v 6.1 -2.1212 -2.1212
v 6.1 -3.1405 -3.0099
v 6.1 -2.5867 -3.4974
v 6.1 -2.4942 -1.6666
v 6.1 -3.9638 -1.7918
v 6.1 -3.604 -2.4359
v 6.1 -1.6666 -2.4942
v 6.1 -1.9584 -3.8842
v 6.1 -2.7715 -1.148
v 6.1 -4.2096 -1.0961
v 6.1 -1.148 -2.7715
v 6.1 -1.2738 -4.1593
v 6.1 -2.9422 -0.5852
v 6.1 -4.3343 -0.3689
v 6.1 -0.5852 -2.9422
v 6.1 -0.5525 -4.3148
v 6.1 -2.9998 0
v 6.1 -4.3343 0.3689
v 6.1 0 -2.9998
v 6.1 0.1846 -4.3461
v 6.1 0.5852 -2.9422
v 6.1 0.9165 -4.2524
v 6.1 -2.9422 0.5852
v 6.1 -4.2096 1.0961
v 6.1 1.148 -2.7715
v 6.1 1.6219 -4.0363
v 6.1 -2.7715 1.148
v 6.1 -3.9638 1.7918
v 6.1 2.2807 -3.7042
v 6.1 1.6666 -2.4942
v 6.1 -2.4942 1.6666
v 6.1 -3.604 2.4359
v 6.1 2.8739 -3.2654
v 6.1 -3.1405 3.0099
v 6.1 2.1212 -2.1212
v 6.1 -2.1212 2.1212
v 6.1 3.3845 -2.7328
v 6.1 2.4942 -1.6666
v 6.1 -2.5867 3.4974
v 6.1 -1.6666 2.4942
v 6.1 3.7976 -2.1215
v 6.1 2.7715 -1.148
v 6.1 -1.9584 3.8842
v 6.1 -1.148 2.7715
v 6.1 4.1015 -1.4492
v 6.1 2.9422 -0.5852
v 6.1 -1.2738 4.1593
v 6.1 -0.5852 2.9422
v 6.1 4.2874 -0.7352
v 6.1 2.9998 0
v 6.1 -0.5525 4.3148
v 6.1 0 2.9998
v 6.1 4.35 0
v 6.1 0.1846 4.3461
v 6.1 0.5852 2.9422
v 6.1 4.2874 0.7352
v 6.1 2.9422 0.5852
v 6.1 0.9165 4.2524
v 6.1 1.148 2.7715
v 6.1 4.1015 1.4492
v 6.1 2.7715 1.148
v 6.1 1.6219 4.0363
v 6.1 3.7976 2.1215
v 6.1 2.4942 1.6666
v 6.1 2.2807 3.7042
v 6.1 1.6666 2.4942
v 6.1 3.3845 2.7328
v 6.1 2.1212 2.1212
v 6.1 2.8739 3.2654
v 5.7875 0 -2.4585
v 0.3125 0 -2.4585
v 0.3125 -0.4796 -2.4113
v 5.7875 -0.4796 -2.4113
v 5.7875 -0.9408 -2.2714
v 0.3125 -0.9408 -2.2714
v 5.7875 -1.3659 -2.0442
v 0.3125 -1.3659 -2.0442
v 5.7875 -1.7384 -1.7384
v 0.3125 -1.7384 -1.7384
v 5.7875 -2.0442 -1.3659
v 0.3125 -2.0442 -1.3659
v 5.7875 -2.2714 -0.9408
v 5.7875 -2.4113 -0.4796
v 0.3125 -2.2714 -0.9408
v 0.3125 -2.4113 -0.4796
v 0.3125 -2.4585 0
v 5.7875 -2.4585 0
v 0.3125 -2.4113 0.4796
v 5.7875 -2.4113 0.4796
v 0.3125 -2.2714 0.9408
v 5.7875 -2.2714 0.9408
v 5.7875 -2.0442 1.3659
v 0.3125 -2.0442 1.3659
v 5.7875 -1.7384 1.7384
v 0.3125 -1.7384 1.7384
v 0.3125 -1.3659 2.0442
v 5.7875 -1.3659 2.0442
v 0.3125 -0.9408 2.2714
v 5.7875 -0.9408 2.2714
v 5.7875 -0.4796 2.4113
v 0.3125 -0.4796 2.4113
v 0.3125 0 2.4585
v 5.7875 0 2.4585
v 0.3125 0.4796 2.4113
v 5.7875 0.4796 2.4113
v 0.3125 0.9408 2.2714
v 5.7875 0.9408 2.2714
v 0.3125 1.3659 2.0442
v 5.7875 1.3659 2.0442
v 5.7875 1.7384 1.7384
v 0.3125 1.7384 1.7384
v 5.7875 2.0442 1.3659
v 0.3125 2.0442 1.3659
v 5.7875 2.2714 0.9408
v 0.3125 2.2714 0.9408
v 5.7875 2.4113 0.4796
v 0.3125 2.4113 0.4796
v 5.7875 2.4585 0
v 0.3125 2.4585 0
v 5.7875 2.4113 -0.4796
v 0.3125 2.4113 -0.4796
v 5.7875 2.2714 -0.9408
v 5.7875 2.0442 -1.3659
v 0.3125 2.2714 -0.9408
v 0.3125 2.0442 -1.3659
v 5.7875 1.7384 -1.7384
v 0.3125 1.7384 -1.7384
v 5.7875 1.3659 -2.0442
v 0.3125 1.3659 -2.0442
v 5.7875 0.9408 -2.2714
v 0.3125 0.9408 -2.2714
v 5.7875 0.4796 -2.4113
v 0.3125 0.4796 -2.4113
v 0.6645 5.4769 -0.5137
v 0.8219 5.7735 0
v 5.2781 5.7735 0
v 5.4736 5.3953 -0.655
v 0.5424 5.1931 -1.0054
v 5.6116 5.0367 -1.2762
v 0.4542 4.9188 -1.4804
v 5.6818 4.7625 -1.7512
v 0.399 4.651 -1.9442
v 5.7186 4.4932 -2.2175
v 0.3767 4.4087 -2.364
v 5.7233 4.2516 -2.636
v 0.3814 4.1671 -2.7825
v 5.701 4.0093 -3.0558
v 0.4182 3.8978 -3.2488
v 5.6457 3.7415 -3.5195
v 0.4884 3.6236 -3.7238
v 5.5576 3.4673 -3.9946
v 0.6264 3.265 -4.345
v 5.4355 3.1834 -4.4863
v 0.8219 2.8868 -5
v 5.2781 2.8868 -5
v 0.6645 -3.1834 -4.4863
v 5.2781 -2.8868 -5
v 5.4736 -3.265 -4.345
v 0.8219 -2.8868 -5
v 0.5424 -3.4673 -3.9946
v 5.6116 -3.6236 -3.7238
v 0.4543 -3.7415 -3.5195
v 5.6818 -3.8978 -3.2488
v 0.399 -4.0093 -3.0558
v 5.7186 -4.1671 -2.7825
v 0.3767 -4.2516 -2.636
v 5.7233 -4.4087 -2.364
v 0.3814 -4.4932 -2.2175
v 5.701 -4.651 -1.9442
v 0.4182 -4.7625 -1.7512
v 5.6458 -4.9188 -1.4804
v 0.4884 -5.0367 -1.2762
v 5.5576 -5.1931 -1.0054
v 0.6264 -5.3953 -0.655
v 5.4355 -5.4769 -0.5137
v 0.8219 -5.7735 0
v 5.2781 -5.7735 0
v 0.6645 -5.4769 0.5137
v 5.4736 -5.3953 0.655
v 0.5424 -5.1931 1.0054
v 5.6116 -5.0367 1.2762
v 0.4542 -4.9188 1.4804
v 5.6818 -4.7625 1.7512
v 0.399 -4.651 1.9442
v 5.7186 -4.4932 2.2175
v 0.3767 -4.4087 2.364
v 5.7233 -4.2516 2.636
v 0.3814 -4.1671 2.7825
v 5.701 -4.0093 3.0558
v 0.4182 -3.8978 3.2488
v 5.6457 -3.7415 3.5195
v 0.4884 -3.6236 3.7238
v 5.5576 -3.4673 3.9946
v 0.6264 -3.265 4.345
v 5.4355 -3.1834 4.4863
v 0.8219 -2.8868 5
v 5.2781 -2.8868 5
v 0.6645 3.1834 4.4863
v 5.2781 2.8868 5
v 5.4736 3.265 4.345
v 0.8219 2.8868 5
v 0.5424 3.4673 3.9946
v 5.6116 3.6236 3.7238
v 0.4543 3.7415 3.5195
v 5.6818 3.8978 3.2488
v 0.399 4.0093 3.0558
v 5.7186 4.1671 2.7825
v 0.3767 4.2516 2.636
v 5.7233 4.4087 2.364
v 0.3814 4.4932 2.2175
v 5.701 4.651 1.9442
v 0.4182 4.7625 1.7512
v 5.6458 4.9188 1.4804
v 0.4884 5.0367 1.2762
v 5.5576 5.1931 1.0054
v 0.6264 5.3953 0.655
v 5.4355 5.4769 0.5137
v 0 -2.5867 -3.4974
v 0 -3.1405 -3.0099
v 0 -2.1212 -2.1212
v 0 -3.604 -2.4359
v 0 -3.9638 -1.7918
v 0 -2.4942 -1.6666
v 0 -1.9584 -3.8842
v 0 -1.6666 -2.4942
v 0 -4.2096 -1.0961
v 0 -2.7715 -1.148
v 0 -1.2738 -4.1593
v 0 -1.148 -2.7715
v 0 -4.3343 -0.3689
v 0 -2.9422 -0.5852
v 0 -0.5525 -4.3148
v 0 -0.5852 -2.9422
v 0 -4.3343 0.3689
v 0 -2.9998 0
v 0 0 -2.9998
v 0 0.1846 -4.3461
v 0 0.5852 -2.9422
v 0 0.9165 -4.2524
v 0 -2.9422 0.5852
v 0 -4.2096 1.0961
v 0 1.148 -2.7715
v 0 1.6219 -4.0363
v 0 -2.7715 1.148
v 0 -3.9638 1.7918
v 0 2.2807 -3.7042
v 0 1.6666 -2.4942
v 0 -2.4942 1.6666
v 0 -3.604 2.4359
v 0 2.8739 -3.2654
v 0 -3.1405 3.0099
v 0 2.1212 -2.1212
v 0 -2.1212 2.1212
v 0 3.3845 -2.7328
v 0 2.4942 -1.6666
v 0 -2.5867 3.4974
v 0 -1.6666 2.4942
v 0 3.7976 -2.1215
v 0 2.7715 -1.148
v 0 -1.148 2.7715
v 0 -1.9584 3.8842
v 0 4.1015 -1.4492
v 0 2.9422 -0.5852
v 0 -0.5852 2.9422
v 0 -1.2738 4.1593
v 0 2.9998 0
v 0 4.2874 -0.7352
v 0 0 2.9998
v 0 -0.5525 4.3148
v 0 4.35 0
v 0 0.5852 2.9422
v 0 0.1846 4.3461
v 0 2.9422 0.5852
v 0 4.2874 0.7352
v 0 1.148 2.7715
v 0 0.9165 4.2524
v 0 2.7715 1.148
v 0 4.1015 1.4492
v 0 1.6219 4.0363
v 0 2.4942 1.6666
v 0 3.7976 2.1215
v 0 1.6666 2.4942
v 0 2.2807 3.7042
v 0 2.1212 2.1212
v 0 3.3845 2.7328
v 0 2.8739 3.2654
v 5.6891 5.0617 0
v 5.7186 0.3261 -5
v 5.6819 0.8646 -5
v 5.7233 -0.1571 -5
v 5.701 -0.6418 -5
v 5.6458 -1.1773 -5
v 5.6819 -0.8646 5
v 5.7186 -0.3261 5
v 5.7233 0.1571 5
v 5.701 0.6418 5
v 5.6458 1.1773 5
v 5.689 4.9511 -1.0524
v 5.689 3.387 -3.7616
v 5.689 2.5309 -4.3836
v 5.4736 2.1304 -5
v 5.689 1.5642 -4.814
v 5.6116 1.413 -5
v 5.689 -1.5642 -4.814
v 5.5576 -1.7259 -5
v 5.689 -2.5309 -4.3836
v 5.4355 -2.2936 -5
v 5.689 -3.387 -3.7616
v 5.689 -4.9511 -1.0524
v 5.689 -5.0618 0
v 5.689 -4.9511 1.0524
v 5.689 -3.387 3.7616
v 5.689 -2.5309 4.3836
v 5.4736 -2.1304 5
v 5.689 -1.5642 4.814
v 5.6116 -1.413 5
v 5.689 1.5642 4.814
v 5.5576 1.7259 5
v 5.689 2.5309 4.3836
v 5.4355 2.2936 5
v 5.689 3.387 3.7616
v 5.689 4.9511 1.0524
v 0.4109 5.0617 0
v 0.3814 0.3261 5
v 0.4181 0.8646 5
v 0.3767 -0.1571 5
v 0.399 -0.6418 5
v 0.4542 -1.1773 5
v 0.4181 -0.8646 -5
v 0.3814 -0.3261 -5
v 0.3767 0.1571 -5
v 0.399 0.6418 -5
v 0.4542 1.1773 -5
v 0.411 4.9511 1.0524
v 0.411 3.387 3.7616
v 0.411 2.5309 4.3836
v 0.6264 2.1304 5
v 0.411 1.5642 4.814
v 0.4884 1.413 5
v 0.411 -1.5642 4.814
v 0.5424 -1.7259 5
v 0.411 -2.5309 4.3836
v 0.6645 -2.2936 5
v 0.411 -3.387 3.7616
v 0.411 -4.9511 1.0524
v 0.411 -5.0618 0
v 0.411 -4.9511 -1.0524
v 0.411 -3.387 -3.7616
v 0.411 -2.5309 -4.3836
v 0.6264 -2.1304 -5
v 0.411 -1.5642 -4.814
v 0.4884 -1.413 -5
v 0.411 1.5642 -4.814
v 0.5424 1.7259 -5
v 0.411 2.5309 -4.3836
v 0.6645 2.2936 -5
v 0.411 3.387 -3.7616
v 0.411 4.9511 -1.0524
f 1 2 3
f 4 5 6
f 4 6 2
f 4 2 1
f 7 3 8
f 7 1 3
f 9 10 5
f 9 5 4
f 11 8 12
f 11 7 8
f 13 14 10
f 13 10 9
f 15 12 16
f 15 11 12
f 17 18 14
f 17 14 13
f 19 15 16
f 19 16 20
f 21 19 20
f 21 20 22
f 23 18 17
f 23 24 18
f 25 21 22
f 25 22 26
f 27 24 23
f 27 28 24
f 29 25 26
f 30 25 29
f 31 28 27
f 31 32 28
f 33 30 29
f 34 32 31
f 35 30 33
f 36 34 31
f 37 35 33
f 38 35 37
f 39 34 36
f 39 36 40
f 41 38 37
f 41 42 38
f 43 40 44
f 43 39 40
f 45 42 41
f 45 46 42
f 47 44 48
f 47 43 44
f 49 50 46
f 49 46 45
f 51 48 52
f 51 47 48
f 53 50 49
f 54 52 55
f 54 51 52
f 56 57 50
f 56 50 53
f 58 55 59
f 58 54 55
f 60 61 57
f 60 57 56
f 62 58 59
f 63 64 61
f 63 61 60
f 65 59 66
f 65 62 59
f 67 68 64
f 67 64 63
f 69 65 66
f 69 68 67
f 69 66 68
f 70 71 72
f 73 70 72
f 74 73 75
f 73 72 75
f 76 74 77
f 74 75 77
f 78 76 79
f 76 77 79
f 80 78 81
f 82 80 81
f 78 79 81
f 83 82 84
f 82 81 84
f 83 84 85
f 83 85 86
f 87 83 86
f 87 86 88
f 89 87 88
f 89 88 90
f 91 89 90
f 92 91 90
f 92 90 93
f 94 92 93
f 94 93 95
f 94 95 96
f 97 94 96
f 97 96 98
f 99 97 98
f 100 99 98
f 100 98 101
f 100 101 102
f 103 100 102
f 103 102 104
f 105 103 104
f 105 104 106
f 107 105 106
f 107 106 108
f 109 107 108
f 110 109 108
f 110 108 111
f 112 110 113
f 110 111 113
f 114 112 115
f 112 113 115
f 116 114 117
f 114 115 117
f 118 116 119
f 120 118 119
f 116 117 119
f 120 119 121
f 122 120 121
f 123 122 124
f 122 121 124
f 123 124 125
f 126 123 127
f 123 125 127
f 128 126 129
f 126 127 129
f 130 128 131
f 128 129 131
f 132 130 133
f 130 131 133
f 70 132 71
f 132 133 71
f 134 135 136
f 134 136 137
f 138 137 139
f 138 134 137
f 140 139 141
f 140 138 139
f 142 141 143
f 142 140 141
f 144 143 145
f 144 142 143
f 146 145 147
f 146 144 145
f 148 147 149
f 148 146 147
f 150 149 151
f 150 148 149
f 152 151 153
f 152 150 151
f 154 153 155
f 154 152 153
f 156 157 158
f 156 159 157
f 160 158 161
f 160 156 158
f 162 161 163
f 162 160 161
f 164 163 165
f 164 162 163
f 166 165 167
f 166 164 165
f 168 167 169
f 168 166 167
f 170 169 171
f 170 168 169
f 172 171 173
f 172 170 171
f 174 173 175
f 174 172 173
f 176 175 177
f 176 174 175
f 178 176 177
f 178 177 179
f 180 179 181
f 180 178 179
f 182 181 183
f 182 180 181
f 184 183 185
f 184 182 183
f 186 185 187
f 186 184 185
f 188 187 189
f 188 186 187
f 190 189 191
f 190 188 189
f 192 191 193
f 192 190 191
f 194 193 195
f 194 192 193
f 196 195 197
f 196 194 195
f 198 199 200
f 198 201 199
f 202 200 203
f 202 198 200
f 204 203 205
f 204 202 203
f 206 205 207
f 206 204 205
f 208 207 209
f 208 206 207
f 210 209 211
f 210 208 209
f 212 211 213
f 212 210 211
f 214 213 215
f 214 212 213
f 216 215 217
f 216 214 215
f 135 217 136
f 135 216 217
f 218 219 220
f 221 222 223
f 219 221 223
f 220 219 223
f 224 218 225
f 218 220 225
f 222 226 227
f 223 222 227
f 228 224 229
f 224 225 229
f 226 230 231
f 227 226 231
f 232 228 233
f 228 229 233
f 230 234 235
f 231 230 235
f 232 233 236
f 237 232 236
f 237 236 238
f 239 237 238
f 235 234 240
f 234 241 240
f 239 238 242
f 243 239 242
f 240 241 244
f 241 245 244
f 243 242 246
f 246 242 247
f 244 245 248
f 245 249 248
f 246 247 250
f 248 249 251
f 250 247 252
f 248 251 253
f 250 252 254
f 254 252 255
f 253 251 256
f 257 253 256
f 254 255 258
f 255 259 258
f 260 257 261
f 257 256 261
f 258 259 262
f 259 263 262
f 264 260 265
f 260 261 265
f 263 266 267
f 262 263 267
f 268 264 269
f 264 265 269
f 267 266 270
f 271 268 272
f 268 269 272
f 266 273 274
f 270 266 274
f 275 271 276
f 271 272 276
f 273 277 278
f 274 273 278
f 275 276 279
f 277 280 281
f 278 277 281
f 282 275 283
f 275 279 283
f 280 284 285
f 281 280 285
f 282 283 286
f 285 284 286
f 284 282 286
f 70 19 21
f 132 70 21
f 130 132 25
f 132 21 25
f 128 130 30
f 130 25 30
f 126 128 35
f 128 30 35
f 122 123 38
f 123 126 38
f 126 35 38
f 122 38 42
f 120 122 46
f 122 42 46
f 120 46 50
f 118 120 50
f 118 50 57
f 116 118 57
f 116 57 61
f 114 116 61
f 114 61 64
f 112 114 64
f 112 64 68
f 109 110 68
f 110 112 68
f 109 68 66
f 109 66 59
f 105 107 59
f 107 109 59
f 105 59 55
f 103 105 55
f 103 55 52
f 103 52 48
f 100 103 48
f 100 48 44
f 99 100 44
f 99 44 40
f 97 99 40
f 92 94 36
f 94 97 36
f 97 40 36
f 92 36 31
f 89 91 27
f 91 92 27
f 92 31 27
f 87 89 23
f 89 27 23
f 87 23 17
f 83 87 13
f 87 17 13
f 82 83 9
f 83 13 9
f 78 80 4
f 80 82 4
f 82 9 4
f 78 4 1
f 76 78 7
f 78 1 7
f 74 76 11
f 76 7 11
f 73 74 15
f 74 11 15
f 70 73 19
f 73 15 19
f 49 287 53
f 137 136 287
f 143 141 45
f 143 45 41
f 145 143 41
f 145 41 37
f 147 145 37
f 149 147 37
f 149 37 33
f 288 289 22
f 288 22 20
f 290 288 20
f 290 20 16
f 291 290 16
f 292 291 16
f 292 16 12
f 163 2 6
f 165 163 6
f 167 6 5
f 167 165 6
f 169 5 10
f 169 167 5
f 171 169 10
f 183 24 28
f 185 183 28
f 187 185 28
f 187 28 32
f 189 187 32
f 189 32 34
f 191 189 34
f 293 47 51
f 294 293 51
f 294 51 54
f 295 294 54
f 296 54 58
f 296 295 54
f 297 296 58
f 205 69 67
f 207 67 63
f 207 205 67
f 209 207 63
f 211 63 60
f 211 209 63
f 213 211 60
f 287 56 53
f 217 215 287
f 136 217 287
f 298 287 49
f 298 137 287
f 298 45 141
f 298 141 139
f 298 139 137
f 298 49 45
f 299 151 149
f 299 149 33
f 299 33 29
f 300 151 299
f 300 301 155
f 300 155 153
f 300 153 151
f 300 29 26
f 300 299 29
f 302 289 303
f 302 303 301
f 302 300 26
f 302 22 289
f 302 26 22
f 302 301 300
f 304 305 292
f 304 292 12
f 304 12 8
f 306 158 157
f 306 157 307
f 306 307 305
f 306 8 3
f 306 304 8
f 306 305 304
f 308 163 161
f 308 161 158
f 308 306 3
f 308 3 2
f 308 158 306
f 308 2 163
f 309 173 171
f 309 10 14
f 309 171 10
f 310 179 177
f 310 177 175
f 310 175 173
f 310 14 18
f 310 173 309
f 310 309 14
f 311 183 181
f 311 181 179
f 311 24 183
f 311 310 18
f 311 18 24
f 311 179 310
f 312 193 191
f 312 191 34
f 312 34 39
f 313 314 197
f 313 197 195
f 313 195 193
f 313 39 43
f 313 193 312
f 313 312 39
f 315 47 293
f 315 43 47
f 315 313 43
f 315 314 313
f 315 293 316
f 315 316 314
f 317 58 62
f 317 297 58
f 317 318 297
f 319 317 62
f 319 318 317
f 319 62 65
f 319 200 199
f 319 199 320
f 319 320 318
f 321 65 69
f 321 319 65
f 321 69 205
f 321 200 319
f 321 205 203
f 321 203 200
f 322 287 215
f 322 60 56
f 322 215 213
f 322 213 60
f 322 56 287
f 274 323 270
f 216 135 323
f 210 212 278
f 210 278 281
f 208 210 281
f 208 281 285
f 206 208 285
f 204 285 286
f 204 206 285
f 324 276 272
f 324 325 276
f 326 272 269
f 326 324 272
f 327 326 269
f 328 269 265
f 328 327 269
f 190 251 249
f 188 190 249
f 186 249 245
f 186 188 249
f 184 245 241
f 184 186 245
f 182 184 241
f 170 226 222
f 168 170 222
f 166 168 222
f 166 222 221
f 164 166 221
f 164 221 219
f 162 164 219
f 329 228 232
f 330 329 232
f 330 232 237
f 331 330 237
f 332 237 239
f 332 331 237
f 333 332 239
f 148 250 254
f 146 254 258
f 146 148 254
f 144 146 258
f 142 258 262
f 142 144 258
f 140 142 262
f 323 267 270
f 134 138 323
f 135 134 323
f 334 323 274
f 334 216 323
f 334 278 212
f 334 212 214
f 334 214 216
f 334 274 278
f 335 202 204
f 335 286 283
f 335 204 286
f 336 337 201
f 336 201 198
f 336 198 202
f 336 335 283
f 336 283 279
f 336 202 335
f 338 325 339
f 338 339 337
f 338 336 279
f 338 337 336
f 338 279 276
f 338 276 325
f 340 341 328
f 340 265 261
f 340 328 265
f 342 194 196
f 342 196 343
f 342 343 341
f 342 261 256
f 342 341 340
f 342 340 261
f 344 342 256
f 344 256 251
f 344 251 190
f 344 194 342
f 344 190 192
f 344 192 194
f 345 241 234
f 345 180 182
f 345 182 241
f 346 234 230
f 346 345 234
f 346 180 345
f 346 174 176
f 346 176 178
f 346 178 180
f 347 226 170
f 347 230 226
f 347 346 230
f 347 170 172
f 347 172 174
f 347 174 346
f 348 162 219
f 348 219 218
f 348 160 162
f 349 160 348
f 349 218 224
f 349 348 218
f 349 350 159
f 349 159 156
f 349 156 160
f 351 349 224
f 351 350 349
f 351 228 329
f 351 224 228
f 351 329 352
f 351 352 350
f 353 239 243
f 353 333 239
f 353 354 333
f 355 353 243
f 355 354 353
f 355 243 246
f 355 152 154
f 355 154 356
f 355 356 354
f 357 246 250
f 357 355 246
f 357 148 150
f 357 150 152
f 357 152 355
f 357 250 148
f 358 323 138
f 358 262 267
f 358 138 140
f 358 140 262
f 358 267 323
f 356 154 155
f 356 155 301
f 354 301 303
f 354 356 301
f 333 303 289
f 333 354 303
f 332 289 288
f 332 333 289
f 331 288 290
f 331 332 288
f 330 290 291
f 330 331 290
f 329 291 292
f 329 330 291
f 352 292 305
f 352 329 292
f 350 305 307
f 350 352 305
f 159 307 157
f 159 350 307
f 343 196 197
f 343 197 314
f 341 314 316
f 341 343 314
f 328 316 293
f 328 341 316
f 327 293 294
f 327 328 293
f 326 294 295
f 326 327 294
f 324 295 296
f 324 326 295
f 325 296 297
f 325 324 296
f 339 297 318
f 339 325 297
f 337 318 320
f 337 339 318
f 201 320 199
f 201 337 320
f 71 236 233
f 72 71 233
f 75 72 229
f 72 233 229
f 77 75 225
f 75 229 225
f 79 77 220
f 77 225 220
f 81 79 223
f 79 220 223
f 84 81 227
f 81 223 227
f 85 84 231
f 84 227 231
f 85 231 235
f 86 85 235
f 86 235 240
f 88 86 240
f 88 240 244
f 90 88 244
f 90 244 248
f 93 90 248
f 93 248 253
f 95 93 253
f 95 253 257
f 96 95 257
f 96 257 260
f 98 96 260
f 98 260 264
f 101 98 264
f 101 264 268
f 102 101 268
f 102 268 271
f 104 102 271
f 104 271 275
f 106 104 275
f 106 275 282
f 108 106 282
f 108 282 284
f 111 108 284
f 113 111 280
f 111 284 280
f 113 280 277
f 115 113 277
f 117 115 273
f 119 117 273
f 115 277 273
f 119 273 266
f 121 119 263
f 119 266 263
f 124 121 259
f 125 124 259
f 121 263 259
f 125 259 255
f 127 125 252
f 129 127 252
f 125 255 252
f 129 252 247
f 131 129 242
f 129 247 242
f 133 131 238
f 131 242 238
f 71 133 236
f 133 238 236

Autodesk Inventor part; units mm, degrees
ref_plane "YZ Plane" through (0, 0, 0) normal (1, 0, 0) x (0, 1, 0)
ref_plane "XZ Plane" through (0, 0, 0) normal (0, 1, 0) x (-1, 0, 0)
sketch "Sketch1" plane through (0, 0, 0) normal (1, 0, 0) x (0, 1, 0)
  line L0 (-5.7735, 0) -> (-2.8868, 5)
  line L1 (-2.8868, 5) -> (2.8868, 5)
  line L2 (2.8868, 5) -> (5.7735, 0)
  line L3 (5.7735, 0) -> (2.8868, -5)
  line L4 (2.8868, -5) -> (-2.8868, -5)
  line L5 (-2.8868, -5) -> (-5.7735, 0)
  point P0 (0, 0)
  point P1 (0, 0)
  dimension "d0" = 11.547
extrude "Body" add sketch "Sketch1" along normal blind 6.1
sketch "Sketch2" plane through (0, 0, 0) normal (0, 0, 1) x (1, 0, 0)
  line L0 (0, 2.8868) -> (0, 5.7735) projected
  line L1 (0, 5.7735) -> (6.1, 5.7735) projected
  line L2 (6.1, 2.8868) -> (6.1, 5.7735) projected
  line L3 (-1.22, 0) -> (7.32, 0) projected
  line L4 (0.8219, 5.7735) -> (0, 4.35)
  line L5 (5.2781, 5.7735) -> (6.1, 4.35)
  dimension "d3" = 30
  dimension "d4" = 30
  dimension "d5" = 8.7
  dimension "d6" = 8.7
revolve "Chamfer1" cut sketch "Sketch2" angle 360 about axis through (-10, 0, 0) along (1, 0, 0)
sketch "Sketch3" plane through (6.1, 0, 0) normal (1, 0, 0) x (0, 0, -1)
  arc A0 (-0.625, -1.0825) -> (0.625, -1.0825) centre (0, 0) ccw projected
hole "Thread" at (6.1, 0, 0) direction (-1, 0, 0) diameter 4.917 end through all thread size "M6x1" class "6H" standard "ISO Metric profile"
chamfer "Chamfer2" distance 0.5413 angle 30 1 edges at (6.1, 0, 2.4585) measured on face at (6.1, 3.6714, -0.4458)
chamfer "Chamfer3" distance 0.5413 angle 30 1 edges at (0, 0, 2.4585) measured on face at (0, 3.6714, -0.4458)
ref_plane "Work Plane1" through (-10.3567, 0, 0) normal (0, -0.8660254, -0.5) x (1, 0, 0)
equation "\"d0\" = 1.1547 * SW"
equation "\"d1\" = KOH"
equation "\"d3\" = ANG1"
equation "\"d4\" = ANG2"
equation "\"d5\" = SW0"
equation "\"d6\" = SW01"
equation "\"d8\" = -0.5 * GD1 + 0.5 * NND"
equation "\"d40\" = -0.5 * GD1 + 0.5 * NND"
equation "\"d10\" = -0.5 * GD1 + 0.5 * NND"
equation "\"d41\" = -0.5 * GD1 + 0.5 * NND"
equation "\"ANG1\" = 30deg"
equation "\"ANG2\" = 30deg"
equation "\"NND\" = 6"
equation "\"KOH\" = 6.1"
equation "\"SW0\" = 8.7"
equation "\"SW01\" = SW0"
equation "\"GUL\" = 0.541266 * PTC"
equation "\"THREADDIA\" = 6"
equation "\"TOA\" = 30deg"
equation "\"PTC\" = 1"
equation "\"E0\" = 1.155 * SW"
equation "\"GAL\" = 0.541266 * PTC"
equation "\"SW\" = 10"
equation "\"GD1\" = 4.917468"
properties part number "ISO 4034 - M6" material "Steel"
